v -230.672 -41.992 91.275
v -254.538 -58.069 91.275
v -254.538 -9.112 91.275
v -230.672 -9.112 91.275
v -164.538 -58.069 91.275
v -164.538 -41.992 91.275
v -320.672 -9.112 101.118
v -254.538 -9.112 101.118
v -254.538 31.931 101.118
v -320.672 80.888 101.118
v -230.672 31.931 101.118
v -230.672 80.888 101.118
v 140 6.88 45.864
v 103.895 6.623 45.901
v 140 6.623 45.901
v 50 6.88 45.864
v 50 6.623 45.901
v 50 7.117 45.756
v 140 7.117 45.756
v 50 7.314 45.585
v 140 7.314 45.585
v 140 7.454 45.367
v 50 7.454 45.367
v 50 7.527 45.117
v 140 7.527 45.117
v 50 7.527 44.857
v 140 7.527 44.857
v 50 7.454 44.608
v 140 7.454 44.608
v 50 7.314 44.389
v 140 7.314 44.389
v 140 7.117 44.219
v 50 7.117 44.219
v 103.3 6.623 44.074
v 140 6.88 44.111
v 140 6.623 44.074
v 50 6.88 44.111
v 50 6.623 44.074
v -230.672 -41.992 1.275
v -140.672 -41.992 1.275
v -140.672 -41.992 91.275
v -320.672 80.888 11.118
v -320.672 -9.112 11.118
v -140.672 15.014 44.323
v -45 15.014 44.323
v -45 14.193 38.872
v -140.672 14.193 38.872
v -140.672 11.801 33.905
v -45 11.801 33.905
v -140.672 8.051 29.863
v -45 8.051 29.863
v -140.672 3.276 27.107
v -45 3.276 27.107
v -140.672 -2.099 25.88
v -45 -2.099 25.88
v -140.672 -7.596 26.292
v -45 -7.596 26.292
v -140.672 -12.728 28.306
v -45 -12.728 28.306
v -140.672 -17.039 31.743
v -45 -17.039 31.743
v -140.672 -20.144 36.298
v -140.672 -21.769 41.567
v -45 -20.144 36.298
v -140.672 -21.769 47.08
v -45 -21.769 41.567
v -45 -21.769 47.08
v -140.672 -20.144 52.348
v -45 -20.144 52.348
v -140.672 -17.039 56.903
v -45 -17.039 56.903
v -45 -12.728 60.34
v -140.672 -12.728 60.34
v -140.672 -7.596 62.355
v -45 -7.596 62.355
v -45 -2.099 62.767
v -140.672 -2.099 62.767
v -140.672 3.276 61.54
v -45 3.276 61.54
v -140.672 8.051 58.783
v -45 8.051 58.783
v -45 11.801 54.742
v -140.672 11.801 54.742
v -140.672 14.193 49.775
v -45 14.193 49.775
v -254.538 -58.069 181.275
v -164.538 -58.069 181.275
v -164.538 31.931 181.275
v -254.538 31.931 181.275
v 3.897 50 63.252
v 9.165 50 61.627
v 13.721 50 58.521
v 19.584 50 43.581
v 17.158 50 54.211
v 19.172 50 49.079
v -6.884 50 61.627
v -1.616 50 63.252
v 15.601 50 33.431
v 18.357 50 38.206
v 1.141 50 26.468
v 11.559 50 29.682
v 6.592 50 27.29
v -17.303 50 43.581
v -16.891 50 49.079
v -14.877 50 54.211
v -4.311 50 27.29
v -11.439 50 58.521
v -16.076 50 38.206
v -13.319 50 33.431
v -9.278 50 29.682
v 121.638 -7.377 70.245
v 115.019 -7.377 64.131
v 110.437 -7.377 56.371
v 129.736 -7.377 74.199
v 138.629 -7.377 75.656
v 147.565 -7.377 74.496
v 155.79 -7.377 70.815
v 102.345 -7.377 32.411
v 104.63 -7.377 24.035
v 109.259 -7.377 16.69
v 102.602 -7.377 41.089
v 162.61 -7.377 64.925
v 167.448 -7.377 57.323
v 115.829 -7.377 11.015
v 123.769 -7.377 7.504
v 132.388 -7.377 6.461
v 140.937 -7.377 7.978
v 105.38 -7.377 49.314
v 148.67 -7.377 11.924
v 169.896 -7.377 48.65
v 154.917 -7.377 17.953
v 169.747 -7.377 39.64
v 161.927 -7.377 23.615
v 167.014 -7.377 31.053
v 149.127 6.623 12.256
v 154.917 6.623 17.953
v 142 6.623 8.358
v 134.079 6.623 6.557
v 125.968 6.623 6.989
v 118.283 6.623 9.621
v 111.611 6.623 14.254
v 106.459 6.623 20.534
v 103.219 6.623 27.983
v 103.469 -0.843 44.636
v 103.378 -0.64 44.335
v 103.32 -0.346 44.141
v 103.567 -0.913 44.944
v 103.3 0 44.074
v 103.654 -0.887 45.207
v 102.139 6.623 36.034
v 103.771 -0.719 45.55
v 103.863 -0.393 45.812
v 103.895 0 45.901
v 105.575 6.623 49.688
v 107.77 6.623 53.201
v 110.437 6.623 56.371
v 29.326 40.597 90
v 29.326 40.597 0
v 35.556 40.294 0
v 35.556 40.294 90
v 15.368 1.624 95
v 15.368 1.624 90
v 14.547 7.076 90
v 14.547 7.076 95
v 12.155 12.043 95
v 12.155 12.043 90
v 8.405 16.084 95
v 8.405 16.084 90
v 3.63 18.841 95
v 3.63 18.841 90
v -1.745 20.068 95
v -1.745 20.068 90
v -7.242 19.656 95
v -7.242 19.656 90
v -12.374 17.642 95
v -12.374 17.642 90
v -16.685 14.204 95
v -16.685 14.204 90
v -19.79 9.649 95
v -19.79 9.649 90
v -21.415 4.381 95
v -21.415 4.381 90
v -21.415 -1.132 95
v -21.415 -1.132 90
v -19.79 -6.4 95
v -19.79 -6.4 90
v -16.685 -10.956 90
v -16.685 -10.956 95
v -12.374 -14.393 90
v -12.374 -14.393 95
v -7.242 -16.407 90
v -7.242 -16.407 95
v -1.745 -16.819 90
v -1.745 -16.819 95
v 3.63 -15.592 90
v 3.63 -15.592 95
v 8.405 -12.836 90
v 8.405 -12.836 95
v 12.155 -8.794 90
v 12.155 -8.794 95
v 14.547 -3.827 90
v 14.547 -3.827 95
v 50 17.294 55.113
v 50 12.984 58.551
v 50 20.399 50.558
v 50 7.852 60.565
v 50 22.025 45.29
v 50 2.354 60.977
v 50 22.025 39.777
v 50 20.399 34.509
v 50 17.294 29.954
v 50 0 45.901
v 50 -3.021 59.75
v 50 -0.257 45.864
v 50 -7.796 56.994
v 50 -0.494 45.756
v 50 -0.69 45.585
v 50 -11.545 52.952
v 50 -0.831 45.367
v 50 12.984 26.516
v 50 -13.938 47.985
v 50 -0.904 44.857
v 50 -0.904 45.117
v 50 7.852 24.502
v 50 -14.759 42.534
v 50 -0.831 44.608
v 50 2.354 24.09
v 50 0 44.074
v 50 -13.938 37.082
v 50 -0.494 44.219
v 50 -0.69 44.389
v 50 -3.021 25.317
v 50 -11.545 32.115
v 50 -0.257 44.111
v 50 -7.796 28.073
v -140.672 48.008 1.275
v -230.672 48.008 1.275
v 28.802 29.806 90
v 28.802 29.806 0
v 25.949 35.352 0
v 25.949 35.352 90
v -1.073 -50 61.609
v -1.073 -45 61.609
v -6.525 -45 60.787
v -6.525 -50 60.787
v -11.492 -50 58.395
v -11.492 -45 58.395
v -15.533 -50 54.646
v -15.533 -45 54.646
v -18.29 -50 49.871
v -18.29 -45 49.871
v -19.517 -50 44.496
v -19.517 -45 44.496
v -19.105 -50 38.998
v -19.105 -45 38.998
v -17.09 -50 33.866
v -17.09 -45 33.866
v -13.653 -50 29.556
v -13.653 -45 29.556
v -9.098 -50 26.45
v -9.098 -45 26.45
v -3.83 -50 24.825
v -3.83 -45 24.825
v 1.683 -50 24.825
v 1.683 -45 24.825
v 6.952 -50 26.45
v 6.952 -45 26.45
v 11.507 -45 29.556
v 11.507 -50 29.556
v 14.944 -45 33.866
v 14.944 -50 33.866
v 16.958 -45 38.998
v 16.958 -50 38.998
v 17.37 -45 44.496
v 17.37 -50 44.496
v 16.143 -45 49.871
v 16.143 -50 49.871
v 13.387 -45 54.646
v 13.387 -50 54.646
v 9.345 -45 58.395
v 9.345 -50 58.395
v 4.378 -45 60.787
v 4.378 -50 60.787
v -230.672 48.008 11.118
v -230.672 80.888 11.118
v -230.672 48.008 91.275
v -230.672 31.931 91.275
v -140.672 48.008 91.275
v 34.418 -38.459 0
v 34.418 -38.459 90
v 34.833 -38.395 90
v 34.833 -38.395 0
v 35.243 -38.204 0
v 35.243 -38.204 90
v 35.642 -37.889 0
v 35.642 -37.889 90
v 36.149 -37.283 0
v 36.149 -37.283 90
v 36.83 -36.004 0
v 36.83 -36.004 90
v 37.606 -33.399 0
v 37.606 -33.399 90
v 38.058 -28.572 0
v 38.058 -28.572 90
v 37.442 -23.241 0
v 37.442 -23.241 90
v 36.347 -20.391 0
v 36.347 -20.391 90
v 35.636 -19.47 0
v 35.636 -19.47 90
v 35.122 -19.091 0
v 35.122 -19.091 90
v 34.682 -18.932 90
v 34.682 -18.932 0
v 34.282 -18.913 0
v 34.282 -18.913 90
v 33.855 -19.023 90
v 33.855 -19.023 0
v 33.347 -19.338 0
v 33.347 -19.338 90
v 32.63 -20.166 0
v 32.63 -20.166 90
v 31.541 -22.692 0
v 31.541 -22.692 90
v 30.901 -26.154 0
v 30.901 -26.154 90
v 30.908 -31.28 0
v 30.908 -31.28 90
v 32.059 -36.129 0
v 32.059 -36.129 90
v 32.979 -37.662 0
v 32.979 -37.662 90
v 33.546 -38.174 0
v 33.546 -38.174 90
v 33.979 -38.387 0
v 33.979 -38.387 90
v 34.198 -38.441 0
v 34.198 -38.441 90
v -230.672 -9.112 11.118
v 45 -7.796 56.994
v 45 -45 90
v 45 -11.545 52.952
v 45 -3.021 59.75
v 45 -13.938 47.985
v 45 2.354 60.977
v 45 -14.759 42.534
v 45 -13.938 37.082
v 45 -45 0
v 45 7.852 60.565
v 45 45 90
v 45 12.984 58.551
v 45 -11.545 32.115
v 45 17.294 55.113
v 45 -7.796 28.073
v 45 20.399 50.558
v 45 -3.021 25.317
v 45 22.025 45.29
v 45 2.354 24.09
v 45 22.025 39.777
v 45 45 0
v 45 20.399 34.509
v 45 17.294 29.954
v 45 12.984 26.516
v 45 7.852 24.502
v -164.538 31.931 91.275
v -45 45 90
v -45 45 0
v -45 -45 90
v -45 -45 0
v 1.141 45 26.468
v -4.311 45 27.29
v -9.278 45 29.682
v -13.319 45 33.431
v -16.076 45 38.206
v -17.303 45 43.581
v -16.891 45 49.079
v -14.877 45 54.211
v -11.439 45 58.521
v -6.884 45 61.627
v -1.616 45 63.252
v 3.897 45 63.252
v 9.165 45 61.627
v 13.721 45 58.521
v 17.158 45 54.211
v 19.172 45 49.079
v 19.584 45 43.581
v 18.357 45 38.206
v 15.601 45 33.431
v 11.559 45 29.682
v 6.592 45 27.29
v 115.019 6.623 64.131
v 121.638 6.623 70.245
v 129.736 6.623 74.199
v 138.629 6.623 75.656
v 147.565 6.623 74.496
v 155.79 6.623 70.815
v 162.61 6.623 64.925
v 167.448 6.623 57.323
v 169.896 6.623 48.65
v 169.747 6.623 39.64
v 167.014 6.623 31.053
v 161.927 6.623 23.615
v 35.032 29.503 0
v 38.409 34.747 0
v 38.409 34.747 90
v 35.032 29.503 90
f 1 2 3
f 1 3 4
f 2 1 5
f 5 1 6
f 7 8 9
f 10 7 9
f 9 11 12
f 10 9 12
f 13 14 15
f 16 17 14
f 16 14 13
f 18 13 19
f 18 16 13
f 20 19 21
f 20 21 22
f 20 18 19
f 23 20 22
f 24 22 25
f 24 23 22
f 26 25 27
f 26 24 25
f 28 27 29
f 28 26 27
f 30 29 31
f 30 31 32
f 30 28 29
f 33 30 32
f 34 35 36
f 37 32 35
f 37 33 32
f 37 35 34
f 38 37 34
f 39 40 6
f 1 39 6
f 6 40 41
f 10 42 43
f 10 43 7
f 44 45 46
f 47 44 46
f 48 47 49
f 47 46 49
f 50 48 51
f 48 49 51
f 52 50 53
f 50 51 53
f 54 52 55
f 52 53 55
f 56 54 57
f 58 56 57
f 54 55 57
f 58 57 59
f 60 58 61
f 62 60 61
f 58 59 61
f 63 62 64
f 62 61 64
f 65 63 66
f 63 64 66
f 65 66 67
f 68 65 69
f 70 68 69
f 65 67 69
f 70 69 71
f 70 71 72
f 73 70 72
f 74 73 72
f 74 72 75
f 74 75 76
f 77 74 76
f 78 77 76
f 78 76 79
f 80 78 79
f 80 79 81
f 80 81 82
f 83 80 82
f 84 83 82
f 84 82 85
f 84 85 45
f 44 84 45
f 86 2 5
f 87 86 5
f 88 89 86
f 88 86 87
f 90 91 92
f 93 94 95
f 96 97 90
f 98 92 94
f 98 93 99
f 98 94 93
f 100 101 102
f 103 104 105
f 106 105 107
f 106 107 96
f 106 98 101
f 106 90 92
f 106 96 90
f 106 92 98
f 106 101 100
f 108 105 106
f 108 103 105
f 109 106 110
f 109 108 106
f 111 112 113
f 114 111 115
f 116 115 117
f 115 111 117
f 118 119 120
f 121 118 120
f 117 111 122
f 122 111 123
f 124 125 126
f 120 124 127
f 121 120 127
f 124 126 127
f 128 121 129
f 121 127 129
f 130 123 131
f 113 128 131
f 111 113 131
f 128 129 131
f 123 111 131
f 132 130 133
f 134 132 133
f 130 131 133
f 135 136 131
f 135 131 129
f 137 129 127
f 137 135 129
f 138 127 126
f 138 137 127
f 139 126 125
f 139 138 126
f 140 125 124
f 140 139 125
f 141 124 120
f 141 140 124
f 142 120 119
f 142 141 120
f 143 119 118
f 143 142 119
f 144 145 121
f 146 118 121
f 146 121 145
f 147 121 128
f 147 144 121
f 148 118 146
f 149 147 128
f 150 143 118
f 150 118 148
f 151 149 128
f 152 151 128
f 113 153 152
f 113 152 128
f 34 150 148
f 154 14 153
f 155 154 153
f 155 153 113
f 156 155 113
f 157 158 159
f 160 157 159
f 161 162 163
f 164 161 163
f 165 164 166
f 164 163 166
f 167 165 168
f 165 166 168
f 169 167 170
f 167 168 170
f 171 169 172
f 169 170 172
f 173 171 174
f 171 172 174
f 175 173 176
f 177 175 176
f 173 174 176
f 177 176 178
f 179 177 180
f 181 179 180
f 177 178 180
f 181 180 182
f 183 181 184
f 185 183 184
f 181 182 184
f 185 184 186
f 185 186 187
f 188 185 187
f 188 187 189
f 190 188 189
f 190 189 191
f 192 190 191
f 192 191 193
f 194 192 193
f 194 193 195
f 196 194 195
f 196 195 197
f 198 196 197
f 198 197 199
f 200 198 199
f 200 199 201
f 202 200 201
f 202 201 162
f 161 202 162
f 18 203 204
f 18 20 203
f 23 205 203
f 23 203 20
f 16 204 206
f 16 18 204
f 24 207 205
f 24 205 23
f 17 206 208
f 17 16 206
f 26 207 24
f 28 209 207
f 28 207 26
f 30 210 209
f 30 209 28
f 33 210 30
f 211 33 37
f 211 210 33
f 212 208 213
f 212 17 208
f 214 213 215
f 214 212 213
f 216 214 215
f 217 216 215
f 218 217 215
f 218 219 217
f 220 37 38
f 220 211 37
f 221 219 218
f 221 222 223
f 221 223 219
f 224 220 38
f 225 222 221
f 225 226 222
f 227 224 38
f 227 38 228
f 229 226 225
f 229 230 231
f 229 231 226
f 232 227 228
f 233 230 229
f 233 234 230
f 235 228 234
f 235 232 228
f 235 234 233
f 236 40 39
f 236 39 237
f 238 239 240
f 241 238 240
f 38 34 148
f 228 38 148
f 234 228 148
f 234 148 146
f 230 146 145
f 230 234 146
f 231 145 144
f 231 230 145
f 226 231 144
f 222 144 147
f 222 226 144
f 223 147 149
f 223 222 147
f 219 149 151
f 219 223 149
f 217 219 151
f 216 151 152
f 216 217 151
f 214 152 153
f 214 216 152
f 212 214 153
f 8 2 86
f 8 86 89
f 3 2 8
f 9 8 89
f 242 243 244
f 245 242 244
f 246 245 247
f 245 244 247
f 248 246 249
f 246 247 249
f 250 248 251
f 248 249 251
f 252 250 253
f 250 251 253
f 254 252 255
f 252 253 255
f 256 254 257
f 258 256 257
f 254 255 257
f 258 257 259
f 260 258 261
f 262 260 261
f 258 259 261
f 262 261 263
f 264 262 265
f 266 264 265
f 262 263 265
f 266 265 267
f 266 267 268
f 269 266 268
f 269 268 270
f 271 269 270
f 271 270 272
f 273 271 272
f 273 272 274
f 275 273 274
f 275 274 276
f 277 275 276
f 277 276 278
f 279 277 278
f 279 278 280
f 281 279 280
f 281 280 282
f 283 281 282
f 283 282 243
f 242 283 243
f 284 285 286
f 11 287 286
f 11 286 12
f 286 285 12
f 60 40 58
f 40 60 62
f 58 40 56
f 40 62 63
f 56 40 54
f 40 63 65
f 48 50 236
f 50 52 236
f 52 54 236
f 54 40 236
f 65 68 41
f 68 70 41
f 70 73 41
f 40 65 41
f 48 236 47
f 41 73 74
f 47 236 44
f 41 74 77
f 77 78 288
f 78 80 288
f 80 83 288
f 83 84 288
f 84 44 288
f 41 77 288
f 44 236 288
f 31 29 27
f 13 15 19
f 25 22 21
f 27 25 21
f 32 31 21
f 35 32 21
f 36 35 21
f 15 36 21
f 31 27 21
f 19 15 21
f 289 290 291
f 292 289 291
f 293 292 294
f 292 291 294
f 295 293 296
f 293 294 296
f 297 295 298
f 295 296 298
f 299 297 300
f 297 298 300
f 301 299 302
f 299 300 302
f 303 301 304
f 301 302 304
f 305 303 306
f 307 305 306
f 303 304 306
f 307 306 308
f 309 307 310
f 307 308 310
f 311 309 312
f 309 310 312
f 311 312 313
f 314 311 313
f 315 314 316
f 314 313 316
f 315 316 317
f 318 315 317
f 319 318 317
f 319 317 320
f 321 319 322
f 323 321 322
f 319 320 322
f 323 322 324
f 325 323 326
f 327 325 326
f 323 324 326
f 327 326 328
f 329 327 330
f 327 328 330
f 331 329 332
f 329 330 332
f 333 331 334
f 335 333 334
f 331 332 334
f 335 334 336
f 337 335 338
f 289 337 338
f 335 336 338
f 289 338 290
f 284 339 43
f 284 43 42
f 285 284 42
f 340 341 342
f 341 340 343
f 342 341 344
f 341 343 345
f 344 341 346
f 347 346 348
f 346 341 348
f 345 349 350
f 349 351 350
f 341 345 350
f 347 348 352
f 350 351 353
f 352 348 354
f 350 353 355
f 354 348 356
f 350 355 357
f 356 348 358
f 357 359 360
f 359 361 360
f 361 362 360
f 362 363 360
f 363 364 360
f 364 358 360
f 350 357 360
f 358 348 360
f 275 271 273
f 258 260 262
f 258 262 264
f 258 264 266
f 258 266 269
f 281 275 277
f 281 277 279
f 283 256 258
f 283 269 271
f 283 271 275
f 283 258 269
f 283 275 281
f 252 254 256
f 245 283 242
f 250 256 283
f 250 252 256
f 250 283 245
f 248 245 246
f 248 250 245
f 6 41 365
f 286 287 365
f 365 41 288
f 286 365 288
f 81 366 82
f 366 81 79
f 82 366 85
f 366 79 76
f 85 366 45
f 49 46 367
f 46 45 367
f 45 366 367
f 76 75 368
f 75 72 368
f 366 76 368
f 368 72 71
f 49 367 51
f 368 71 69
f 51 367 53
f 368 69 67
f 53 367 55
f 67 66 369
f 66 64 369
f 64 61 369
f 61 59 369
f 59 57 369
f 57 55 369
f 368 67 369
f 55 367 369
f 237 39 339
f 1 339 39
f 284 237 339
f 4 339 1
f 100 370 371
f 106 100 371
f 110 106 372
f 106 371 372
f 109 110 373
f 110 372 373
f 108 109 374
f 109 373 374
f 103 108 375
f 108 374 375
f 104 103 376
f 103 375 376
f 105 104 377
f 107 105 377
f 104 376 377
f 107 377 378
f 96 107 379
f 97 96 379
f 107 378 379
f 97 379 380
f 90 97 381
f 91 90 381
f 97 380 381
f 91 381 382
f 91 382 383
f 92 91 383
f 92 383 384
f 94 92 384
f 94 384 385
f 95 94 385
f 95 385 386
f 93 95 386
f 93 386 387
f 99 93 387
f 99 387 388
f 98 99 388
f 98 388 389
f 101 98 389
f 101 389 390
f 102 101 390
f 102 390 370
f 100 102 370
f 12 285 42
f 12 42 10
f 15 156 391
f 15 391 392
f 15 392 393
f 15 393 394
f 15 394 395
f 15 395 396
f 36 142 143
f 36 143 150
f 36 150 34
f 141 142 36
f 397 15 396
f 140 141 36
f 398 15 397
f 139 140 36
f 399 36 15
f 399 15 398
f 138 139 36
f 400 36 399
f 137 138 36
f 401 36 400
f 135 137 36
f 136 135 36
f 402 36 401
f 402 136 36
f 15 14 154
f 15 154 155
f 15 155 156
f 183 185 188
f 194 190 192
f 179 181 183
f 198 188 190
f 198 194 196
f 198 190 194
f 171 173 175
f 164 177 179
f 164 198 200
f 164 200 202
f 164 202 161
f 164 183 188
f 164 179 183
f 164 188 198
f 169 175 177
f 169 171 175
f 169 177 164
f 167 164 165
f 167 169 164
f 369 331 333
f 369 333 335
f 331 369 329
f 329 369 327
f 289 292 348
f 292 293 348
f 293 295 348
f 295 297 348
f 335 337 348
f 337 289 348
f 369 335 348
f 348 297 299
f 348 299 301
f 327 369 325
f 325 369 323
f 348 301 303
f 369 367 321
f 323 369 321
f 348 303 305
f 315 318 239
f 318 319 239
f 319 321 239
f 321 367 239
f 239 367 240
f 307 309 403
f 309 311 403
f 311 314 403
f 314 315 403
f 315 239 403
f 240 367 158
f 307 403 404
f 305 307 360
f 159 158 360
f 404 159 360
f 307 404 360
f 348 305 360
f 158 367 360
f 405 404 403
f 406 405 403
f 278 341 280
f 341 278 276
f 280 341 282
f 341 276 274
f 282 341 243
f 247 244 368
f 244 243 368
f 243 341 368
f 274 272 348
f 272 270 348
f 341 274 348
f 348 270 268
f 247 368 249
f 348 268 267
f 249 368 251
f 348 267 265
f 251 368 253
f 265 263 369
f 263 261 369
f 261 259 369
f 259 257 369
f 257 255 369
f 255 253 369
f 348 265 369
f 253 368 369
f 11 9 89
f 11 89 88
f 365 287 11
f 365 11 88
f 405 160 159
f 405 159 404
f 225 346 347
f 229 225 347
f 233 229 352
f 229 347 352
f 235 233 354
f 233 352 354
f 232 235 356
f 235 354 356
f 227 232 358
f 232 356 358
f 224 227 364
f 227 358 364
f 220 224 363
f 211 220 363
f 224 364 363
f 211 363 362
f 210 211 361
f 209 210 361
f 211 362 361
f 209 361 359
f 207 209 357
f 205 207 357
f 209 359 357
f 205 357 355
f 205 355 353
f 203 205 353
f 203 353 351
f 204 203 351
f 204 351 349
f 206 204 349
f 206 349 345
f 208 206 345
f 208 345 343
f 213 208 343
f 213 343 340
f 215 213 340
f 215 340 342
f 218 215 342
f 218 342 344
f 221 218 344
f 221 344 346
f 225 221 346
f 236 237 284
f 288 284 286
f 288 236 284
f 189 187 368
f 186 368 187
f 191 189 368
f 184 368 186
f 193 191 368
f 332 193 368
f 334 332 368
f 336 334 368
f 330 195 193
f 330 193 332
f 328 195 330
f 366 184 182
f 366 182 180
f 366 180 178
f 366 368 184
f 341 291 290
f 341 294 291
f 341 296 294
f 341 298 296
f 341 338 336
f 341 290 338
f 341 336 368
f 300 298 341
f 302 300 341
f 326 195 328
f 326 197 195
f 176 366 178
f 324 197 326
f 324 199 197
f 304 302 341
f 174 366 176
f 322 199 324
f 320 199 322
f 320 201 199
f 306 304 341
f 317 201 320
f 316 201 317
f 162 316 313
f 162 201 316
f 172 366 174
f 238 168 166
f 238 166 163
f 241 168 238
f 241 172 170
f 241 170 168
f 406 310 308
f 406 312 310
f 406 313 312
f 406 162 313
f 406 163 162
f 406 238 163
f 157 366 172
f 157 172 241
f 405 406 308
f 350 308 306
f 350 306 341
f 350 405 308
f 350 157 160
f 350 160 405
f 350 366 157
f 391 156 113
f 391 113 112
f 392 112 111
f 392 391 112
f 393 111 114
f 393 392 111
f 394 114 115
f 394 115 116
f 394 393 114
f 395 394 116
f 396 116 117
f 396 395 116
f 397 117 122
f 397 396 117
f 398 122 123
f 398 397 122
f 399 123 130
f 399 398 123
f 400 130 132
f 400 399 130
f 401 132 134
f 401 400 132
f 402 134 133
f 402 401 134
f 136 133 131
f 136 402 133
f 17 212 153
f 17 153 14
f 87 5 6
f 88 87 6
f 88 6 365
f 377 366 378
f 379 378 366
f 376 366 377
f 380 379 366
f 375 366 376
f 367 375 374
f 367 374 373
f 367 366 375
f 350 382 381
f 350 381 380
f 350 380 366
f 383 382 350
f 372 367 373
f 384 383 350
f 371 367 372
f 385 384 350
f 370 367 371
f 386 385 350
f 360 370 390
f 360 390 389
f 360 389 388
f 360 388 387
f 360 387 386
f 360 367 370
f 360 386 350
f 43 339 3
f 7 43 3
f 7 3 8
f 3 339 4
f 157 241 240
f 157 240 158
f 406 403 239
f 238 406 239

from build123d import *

# Parameters (mm, degrees)
SKETCH1_W                = 90
SKETCH1_H                = 90
BOSS_EXTRUDE1_DEPTH      = 90
BOSS_EXTRUDE2_DEPTH      = 5
BOSS_EXTRUDE2_DEPTH_BACK = 90
SKETCH2_R                = 18.495149705
BOSS_EXTRUDE3_DEPTH      = 5
BOSS_EXTRUDE3_DEPTH_BACK = 90
SKETCH3_R                = 18.495149705
BOSS_EXTRUDE4_DEPTH      = 5
BOSS_EXTRUDE4_DEPTH_BACK = 90
SKETCH4_R                = 18.495149705
BOSS_EXTRUDE5_DEPTH      = 95.671853643
BOSS_EXTRUDE5_DEPTH_BACK = 90
SKETCH5_R                = 18.495149705
BOSS_EXTRUDE6_DEPTH      = 5
BOSS_EXTRUDE6_DEPTH_BACK = 90
SKETCH6_R                = 18.495149705
CUT_EXTRUDE1_DEPTH       = 90
SKETCH8_RX               = 9.776430477
SKETCH8_RY               = 3.640340221
CUT_EXTRUDE2_DEPTH       = 90
BOSS_EXTRUDE7_DEPTH      = 90
SKETCH10_R               = 29.435529535
SKETCH10_R_2             = 31.00879633
BOSS_EXTRUDE10_DEPTH     = 14
SKETCH11_W               = 90
SKETCH11_H               = 90
BOSS_EXTRUDE11_DEPTH     = 90
SKETCH14_W               = 90
SKETCH14_H               = 90
BOSS_EXTRUDE12_DEPTH     = 90
SKETCH15_W               = 90
SKETCH15_H               = 90
BOSS_EXTRUDE13_DEPTH     = 90


with BuildPart() as part:
    # Sketch1 → Boss-Extrude1 (new body)
    with BuildSketch(Plane.XY):
        Rectangle(SKETCH1_W, SKETCH1_H)
    extrude(amount=BOSS_EXTRUDE1_DEPTH)

    # Sketch2 → Boss-Extrude2 (add, two sides: drawn at the far end of the back side and taken through both)
    with BuildSketch(Plane(origin=(45, 0, 0), x_dir=(0, 0, -1), z_dir=(1, 0, 0)).offset(-BOSS_EXTRUDE2_DEPTH_BACK)):
        with Locations(Location((-42.533520746, 3.735944486, 0), (0, 0, 270))):
            Circle(SKETCH2_R)
    extrude(amount=BOSS_EXTRUDE2_DEPTH + BOSS_EXTRUDE2_DEPTH_BACK)

    # Sketch3 → Boss-Extrude3 (add, two sides: drawn at the far end of the back side and taken through both)
    with BuildSketch(Plane.XY.offset(90).offset(-BOSS_EXTRUDE3_DEPTH_BACK)):
        with Locations((-3.126781539, 1.624320901)):
            Circle(SKETCH3_R)
    extrude(amount=BOSS_EXTRUDE3_DEPTH + BOSS_EXTRUDE3_DEPTH_BACK)

    # Sketch4 → Boss-Extrude4 (add, two sides: drawn at the far end of the back side and taken through both)
    with BuildSketch(Plane(origin=(0, 45, 0), x_dir=(0, 0, -1), z_dir=(0, 1, 0)).offset(-BOSS_EXTRUDE4_DEPTH_BACK)):
        with Locations((-44.963029761, -1.140691585)):
            Circle(SKETCH4_R)
    extrude(amount=BOSS_EXTRUDE4_DEPTH + BOSS_EXTRUDE4_DEPTH_BACK)

    # Sketch5 → Boss-Extrude5 (add, two sides: drawn at the far end of the back side and taken through both)
    with BuildSketch(Plane.ZY.offset(45).offset(-BOSS_EXTRUDE5_DEPTH_BACK)):
        with Locations(Location((44.323215706, -3.480744369, 0), (0, 0, 90))):
            Circle(SKETCH5_R)
    extrude(amount=BOSS_EXTRUDE5_DEPTH + BOSS_EXTRUDE5_DEPTH_BACK)

    # Sketch6 → Boss-Extrude6 (add, two sides: drawn at the far end of the back side and taken through both)
    with BuildSketch(Plane(origin=(0, -45, 0), x_dir=(0, 0, -1), z_dir=(0, -1, 0)).offset(-BOSS_EXTRUDE6_DEPTH_BACK)):
        with Locations(Location((-43.114009277, -1.073204684, 0), (0, 0, 180))):
            Circle(SKETCH6_R)
    extrude(amount=BOSS_EXTRUDE6_DEPTH + BOSS_EXTRUDE6_DEPTH_BACK)

    # Sketch7 → Cut-Extrude1 (cut)
    with BuildSketch(Plane(origin=(0, 0, 0), x_dir=(-1, 0, 0), z_dir=(0, 0, -1))):
        Polygon((-28.802165797, 29.805616158), (-25.949050166, 35.352304143), (-29.326065052, 40.596518751), (-35.556195569, 40.294045375), (-38.4093112, 34.747357391), (-35.032296314, 29.503142782), align=None)
    extrude(amount=-CUT_EXTRUDE1_DEPTH, mode=Mode.SUBTRACT)

    # Sketch8 → Cut-Extrude2 (cut)
    with BuildSketch(Plane.XY.offset(90)):
        with Locations(Location((34.417640855, -28.6823815), (0, 0, -90))):
            Ellipse(SKETCH8_RX, SKETCH8_RY)
    extrude(amount=-CUT_EXTRUDE2_DEPTH, mode=Mode.SUBTRACT)

    # Sketch9 → Boss-Extrude7 (add)
    with BuildSketch(Plane(origin=(50, 0, 0), x_dir=(0, 0, -1), z_dir=(1, 0, 0))):
        with BuildLine():
            Line((-44.073528041, 6.623037359), (-44.073528041, 0))
            ThreePointArc((-44.073528041, 0), (-44.987170795, -0.913642754), (-45.900813549, 0))
            Line((-45.900813549, 0), (-45.900813549, 6.623037359))
            ThreePointArc((-45.900813549, 6.623037359), (-44.987170795, 7.536680113), (-44.073528041, 6.623037359))
        make_face()
    extrude(amount=BOSS_EXTRUDE7_DEPTH)

    # Sketch10 → Boss-Extrude10 (add)
    with BuildSketch(Plane(origin=(140, 6.623037359, 44.073528041), x_dir=(1, 0, 0), z_dir=(0, 1, 0))):
        with Locations((-8.425763271, 8.188123623)):
            Circle(SKETCH10_R)
        with Locations((-0.853882083, -0.578401306)):
            Circle(SKETCH10_R_2)
    extrude(amount=-BOSS_EXTRUDE10_DEPTH)

    # Sketch11 → Boss-Extrude11 (add)
    with BuildSketch(Plane.ZY.offset(140.671853643)):
        with Locations((46.274660301, 3.007862201)):
            Rectangle(SKETCH11_W, SKETCH11_H)
    extrude(amount=BOSS_EXTRUDE11_DEPTH)

    # Sketch14 → Boss-Extrude12 (add)
    with BuildSketch(Plane.XY.offset(91.274660301)):
        with Locations((-209.537955893, -13.069417981)):
            Rectangle(SKETCH14_W, SKETCH14_H)
    extrude(amount=BOSS_EXTRUDE12_DEPTH)

    # Sketch15 → Boss-Extrude13 (add)
    with BuildSketch(Plane.ZY.offset(230.671853643)):
        with Locations((56.117901354, 35.887776579)):
            Rectangle(SKETCH15_W, SKETCH15_H)
    extrude(amount=BOSS_EXTRUDE13_DEPTH)


solid = part.part
